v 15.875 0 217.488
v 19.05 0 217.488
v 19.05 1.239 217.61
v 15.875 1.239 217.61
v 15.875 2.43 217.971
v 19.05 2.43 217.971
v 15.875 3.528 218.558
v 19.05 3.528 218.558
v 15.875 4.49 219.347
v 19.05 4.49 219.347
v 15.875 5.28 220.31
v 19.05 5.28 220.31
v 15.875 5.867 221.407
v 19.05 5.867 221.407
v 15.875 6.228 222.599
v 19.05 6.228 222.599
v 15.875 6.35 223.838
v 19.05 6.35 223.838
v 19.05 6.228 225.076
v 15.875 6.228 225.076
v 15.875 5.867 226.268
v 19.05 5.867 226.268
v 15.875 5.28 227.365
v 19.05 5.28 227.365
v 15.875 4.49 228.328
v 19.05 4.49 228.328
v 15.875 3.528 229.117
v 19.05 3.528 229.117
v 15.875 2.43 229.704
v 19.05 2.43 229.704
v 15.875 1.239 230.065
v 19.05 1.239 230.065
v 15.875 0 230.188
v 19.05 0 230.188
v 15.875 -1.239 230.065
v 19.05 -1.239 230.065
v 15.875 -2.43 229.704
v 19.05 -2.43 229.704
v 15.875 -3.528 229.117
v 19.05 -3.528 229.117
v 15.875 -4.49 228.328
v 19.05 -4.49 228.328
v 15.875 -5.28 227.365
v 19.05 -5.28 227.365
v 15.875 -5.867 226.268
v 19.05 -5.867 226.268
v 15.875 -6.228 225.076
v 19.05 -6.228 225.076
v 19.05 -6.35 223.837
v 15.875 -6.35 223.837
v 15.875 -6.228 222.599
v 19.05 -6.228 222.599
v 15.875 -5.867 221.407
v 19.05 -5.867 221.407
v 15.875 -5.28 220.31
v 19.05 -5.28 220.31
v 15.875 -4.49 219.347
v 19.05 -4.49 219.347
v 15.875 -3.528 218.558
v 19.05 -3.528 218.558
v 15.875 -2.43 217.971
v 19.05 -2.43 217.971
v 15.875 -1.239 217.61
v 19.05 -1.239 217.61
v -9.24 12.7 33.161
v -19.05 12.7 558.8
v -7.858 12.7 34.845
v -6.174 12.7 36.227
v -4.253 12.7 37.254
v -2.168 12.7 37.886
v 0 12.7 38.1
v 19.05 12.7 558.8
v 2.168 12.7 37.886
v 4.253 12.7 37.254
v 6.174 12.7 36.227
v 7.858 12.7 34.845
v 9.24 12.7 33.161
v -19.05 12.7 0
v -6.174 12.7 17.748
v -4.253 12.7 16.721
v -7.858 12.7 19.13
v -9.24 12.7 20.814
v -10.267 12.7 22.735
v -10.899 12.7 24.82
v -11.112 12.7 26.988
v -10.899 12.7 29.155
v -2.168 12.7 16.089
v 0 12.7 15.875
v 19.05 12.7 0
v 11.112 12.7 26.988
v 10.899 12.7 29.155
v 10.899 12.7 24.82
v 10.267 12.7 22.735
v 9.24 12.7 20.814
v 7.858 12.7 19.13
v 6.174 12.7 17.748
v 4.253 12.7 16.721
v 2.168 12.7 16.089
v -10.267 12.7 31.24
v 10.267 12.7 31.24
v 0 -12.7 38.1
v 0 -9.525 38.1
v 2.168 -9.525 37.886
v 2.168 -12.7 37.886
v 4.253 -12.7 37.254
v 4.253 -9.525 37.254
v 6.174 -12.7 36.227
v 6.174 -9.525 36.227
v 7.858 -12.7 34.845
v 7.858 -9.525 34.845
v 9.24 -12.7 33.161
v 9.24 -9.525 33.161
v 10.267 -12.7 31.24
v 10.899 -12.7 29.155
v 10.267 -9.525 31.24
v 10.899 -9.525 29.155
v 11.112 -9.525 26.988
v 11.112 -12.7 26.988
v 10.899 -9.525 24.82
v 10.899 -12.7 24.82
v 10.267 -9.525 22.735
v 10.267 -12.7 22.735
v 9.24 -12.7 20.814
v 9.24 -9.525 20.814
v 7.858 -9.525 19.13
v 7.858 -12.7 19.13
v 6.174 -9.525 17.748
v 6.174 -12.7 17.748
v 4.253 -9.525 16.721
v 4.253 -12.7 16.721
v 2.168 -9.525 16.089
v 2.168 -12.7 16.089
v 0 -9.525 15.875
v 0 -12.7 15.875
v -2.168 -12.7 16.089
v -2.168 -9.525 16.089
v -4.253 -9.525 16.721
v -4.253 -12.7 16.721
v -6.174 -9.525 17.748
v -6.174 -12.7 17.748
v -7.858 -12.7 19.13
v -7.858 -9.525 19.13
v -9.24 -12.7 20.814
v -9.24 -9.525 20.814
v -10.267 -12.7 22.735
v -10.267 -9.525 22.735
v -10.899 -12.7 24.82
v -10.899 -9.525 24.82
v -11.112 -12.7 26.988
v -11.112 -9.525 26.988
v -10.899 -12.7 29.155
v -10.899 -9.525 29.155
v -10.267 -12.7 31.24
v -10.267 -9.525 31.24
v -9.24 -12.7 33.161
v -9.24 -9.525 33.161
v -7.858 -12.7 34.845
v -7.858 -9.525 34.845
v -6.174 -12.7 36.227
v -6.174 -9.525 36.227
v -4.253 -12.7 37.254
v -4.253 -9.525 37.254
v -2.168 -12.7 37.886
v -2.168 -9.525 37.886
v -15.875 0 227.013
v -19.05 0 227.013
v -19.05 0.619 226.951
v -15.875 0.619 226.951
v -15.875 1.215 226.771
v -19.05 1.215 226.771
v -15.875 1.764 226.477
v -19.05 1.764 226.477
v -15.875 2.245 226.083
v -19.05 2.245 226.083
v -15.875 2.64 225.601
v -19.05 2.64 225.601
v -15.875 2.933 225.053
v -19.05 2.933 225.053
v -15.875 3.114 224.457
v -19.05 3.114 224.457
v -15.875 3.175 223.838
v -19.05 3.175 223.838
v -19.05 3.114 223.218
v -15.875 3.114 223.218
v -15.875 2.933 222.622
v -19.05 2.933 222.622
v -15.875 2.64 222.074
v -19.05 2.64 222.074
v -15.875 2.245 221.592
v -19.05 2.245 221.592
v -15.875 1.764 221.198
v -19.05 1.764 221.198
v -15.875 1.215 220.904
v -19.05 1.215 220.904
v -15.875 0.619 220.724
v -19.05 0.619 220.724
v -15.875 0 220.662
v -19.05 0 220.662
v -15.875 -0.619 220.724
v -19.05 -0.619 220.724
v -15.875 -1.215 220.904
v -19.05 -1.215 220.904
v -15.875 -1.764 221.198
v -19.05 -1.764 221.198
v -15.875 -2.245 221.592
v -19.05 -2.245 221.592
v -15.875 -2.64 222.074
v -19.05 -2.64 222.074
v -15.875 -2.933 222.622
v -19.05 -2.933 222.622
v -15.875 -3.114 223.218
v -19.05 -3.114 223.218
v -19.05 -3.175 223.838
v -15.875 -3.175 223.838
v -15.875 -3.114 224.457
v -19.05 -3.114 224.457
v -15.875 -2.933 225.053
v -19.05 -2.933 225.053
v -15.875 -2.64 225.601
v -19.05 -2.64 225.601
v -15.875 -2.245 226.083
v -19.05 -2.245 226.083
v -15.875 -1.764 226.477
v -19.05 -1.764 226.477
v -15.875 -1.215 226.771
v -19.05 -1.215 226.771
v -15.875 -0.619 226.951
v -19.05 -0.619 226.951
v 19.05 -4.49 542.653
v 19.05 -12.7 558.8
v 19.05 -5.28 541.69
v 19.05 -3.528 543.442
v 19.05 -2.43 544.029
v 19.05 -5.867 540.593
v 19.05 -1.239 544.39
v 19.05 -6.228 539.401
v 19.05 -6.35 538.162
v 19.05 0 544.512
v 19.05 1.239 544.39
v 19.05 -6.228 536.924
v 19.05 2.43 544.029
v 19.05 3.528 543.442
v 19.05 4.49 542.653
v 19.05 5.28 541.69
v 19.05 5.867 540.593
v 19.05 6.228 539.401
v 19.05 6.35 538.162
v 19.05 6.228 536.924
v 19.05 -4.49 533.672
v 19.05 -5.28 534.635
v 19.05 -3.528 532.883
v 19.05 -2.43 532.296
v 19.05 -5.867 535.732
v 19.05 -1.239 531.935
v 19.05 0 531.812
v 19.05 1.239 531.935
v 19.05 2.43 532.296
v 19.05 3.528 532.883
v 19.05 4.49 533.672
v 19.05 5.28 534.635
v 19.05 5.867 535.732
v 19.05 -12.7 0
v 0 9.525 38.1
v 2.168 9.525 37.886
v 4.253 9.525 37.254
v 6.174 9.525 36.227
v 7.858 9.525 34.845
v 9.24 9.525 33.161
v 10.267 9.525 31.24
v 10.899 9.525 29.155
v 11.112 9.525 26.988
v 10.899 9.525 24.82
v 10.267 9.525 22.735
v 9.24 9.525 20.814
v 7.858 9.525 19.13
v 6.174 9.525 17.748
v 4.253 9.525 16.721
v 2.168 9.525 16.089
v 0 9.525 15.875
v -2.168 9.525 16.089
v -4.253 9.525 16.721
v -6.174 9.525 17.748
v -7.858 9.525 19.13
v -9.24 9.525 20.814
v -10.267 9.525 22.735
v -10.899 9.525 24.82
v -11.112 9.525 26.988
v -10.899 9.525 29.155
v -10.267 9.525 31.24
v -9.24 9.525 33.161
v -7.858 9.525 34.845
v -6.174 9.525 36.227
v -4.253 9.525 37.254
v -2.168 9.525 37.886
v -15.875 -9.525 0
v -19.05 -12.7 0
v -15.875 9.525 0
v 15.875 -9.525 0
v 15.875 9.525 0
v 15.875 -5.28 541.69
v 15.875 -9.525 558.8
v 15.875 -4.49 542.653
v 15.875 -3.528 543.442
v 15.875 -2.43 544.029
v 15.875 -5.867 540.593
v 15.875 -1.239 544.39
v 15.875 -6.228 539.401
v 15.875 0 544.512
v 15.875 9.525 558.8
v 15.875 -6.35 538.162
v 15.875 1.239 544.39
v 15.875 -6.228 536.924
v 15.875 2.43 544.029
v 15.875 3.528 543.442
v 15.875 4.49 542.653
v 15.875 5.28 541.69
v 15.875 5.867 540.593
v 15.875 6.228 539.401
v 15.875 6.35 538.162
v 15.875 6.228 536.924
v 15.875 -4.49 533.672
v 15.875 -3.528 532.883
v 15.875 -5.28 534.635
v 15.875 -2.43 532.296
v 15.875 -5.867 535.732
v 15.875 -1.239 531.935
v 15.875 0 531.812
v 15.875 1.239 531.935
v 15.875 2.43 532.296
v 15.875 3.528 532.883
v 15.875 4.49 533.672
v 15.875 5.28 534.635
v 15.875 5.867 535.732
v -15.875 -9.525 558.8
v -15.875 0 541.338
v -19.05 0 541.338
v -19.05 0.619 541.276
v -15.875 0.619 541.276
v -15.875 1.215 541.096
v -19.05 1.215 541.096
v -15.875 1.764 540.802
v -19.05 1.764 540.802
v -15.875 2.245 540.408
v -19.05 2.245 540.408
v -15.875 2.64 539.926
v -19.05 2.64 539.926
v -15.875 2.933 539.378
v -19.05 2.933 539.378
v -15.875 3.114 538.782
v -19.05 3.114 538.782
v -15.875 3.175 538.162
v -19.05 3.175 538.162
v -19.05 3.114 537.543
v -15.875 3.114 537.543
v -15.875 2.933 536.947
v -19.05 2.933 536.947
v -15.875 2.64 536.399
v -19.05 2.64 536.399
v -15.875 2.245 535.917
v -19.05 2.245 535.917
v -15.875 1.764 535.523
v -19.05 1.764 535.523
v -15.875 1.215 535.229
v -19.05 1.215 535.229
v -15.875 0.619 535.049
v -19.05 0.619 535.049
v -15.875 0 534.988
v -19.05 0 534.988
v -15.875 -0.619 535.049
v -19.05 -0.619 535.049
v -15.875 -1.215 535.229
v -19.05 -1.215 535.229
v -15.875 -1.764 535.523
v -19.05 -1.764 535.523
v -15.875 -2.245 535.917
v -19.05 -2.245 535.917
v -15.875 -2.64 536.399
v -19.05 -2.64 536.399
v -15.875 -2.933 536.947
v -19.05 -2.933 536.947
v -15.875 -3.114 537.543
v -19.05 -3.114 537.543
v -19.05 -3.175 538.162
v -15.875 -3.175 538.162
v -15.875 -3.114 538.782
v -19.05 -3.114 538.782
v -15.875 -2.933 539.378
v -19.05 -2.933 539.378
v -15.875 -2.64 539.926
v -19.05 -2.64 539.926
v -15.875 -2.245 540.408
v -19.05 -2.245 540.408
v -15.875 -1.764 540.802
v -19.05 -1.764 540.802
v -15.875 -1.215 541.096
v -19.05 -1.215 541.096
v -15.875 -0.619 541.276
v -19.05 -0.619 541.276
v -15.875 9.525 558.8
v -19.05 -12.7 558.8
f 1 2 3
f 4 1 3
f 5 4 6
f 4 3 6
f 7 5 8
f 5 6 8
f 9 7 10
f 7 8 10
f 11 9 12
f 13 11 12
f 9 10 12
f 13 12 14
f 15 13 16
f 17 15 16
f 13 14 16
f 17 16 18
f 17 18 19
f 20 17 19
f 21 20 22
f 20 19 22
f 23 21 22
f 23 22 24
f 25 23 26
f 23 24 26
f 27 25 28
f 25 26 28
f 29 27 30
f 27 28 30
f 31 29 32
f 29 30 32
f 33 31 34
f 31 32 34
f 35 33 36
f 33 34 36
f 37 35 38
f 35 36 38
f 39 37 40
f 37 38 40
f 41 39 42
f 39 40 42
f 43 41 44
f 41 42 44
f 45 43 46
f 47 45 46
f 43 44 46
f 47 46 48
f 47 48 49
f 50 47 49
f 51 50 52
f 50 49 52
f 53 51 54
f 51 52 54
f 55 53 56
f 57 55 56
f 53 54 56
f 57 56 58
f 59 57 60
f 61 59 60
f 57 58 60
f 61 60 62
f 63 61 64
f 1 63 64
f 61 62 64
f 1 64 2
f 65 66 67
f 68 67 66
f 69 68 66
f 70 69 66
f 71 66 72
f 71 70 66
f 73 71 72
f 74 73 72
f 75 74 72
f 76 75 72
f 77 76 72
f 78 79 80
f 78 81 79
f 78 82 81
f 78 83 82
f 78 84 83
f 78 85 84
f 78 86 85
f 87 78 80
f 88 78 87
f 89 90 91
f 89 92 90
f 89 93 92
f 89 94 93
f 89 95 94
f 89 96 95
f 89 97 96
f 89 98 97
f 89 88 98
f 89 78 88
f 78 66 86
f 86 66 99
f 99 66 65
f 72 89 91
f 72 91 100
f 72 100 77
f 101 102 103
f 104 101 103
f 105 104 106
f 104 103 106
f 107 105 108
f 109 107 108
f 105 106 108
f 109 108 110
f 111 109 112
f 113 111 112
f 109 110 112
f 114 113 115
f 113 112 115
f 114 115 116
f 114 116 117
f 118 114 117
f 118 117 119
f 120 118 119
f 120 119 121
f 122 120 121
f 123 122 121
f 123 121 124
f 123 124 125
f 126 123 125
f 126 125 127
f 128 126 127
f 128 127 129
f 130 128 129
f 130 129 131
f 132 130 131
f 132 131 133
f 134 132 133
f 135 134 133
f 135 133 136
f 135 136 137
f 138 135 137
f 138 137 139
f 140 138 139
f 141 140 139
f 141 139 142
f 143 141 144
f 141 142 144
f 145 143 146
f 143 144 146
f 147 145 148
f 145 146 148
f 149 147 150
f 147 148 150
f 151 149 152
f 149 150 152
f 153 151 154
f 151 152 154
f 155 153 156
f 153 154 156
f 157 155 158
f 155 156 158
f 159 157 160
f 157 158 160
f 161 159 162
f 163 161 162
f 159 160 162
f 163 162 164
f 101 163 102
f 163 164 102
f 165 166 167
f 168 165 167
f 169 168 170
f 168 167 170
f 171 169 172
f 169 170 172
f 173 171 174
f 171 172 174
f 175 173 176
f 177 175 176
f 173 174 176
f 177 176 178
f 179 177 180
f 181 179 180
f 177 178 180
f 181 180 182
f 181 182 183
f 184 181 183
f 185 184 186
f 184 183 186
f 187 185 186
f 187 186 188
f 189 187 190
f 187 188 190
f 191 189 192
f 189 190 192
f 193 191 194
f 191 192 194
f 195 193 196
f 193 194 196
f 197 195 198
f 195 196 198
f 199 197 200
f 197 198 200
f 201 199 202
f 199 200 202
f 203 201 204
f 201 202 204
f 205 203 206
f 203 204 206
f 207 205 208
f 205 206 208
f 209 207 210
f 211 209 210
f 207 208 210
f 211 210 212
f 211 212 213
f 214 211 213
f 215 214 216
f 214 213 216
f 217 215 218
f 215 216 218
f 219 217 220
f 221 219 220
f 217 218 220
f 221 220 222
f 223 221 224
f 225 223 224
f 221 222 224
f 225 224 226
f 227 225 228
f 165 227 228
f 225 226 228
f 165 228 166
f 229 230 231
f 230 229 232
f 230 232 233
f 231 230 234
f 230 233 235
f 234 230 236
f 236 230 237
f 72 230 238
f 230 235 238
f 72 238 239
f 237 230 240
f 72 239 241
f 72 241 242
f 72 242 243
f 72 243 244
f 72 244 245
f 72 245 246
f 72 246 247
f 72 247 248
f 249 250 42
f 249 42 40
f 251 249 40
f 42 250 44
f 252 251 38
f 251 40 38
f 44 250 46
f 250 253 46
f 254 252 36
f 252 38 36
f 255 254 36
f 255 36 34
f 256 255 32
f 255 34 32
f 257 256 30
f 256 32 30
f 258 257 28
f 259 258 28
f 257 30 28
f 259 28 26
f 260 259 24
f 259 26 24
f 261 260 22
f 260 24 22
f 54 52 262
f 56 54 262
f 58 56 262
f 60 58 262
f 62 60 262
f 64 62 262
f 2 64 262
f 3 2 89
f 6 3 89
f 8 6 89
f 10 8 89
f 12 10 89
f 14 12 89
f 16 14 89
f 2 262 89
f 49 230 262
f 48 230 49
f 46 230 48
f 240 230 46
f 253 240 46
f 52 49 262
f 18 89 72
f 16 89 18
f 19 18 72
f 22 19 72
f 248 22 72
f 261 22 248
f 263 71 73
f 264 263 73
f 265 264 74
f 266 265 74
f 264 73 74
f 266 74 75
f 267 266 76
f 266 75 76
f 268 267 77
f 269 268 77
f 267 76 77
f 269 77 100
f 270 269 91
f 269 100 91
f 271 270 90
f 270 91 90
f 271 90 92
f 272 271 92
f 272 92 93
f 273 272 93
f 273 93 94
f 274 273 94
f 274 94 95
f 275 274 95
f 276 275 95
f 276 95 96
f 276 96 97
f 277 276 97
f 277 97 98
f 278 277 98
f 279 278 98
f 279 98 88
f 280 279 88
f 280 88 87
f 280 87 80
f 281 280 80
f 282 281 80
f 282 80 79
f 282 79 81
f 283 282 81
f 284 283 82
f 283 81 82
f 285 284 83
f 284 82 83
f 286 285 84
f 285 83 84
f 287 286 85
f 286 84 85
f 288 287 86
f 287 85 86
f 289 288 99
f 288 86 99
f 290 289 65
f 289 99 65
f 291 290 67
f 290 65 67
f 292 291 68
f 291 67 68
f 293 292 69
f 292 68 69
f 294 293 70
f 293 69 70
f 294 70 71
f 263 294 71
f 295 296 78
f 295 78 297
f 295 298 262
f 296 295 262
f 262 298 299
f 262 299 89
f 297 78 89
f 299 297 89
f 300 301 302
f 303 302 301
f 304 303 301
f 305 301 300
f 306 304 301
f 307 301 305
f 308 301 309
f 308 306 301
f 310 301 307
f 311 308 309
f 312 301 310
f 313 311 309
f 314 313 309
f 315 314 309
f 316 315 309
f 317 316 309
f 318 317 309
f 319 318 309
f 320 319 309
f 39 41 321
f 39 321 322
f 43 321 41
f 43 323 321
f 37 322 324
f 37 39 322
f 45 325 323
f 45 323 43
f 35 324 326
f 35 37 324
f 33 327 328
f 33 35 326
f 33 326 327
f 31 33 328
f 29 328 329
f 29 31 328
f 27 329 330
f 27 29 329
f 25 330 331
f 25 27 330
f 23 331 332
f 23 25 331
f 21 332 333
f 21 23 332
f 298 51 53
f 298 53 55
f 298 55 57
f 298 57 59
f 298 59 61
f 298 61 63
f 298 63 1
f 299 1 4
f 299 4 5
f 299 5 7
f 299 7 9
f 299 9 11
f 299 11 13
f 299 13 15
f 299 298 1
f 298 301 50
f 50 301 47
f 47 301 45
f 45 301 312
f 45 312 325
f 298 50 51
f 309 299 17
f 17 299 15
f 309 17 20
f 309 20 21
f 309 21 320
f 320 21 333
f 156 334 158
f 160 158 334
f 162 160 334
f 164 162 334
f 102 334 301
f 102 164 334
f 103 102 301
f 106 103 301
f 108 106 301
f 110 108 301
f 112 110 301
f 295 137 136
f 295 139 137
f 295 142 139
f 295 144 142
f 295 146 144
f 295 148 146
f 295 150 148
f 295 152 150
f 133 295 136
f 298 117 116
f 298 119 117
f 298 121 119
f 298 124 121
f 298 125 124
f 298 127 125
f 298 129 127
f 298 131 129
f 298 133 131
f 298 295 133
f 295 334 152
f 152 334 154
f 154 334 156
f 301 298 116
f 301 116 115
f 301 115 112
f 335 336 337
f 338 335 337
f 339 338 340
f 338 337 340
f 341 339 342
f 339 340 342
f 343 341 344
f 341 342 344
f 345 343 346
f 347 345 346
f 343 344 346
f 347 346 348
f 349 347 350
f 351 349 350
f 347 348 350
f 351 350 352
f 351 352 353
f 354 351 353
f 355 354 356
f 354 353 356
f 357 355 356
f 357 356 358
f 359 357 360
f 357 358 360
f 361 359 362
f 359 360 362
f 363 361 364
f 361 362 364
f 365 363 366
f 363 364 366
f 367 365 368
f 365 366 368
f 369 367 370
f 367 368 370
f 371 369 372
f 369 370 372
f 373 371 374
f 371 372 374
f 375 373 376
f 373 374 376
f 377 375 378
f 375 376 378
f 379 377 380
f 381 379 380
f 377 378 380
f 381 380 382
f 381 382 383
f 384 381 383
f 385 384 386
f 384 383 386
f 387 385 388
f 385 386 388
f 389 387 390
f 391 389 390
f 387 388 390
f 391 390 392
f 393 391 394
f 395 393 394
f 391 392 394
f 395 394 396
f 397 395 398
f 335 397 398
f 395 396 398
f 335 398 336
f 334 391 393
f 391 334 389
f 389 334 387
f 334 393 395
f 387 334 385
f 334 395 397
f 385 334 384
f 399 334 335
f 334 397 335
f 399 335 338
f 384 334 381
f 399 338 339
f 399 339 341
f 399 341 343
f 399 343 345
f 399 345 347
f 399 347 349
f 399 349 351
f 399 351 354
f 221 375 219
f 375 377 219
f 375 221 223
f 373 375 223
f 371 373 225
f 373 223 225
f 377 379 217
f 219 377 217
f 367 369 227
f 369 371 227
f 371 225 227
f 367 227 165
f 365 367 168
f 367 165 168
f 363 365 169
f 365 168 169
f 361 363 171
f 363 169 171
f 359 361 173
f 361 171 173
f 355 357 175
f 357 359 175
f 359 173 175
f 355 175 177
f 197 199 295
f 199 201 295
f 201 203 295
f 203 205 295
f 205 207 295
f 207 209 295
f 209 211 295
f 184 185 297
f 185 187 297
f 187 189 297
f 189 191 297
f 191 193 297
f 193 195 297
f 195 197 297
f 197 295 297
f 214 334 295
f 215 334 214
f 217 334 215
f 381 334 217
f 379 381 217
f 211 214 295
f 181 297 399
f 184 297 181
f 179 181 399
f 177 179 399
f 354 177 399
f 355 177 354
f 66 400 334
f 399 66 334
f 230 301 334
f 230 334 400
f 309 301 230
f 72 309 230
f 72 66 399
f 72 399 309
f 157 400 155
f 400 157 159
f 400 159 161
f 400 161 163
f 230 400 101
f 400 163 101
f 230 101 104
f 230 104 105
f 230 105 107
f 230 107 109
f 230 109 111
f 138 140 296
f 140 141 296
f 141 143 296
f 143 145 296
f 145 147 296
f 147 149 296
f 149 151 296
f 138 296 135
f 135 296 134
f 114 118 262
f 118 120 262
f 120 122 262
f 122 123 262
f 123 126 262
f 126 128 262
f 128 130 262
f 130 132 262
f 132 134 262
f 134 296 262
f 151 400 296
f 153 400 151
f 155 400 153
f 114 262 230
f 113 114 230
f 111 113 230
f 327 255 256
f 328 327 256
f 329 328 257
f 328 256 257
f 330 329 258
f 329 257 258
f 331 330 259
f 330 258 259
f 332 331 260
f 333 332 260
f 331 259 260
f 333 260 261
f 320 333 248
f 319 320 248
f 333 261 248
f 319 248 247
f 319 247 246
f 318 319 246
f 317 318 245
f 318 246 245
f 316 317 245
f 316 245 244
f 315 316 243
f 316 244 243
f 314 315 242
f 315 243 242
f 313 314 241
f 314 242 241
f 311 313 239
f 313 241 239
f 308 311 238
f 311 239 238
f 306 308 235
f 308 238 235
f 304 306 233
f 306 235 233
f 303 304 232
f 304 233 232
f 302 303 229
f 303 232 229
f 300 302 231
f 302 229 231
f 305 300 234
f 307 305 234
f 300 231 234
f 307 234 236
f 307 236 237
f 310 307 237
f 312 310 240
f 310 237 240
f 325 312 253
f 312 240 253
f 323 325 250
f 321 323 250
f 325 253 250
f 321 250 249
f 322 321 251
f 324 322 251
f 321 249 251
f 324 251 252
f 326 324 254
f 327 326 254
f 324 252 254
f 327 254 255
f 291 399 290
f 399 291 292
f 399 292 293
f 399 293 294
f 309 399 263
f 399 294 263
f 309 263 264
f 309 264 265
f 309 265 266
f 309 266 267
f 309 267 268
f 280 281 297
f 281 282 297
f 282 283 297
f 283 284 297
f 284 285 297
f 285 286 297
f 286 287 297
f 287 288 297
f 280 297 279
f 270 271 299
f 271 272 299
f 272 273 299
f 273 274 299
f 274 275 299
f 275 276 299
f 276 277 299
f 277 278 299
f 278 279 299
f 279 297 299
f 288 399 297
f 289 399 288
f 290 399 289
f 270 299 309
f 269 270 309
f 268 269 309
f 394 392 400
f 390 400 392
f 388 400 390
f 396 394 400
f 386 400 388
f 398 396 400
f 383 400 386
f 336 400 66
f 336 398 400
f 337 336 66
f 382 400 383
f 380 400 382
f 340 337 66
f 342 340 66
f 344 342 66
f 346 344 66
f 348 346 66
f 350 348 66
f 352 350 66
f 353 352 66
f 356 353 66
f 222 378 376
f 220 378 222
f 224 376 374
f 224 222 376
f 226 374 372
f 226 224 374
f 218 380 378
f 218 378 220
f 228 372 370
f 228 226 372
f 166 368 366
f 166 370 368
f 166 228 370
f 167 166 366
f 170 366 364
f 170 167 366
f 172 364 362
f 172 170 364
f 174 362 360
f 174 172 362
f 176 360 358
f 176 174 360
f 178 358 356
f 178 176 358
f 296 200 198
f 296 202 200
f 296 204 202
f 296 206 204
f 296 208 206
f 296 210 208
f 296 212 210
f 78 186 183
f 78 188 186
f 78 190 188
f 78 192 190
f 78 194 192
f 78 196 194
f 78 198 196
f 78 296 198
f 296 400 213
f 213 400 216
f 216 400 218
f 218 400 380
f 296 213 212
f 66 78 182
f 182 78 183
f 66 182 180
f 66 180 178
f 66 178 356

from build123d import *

# Parameters (mm, degrees)
SKETCH1_W           = 38.1
SKETCH1_H           = 25.4
SKETCH1_W_2         = 31.75
SKETCH1_H_2         = 19.05
BOSS_EXTRUDE1_DEPTH = 558.8
CUT_EXTRUDE1_REACH  = 561.701
SKETCH2_R           = 11.1125
SKETCH3_R           = 3.175
CUT_EXTRUDE2_DEPTH  = 3.175
SKETCH4_R           = 6.35
CUT_EXTRUDE3_DEPTH  = 3.175


with BuildPart() as part:
    # Sketch1 → Boss-Extrude1 (new body)
    with BuildSketch(Plane.XY):
        Rectangle(SKETCH1_W, SKETCH1_H)
        Rectangle(SKETCH1_W_2, SKETCH1_H_2, mode=Mode.SUBTRACT)
    extrude(amount=BOSS_EXTRUDE1_DEPTH)

    # Cut-Extrude1: up to this face of the body (flat: up to its plane)
    cut_extrude1_end = Plane(part.part.faces().sort_by_distance((0, -12.7, 279.4))[0])
    # Sketch2 → Cut-Extrude1 (cut, up to the picked face)
    with BuildSketch(Plane(origin=(0, 12.7, 0), x_dir=(1, 0, 0), z_dir=(0, 1, 0)), mode=Mode.PRIVATE) as cut_extrude1_sk1:
        with Locations(Location((0, -26.9875, 0), (0, 0, 270))):
            Circle(SKETCH2_R)
    cut_extrude1_tool1 = split(extrude(cut_extrude1_sk1.sketch, amount=-CUT_EXTRUDE1_REACH, mode=Mode.PRIVATE), bisect_by=cut_extrude1_end, keep=Keep.BOTH, mode=Mode.PRIVATE)
    add(cut_extrude1_tool1.solids().sort_by(Axis((0, 12.7, 26.9875), (0, -1, 0)))[0], mode=Mode.SUBTRACT)

    # Sketch3 → Cut-Extrude2 (cut)
    with BuildSketch(Plane.ZY.offset(19.05)):
        with Locations((538.1625, 0)):
            Circle(SKETCH3_R)
        with Locations((223.8375, 0)):
            Circle(SKETCH3_R)
    extrude(amount=-CUT_EXTRUDE2_DEPTH, mode=Mode.SUBTRACT)

    # Sketch4 → Cut-Extrude3 (cut)
    with BuildSketch(Plane(origin=(19.05, 0, 0), x_dir=(0, 0, -1), z_dir=(1, 0, 0))):
        with Locations((-538.1625, 0)):
            Circle(SKETCH4_R)
        with Locations((-223.8375, 0)):
            Circle(SKETCH4_R)
    extrude(amount=-CUT_EXTRUDE3_DEPTH, mode=Mode.SUBTRACT)


solid = part.part
